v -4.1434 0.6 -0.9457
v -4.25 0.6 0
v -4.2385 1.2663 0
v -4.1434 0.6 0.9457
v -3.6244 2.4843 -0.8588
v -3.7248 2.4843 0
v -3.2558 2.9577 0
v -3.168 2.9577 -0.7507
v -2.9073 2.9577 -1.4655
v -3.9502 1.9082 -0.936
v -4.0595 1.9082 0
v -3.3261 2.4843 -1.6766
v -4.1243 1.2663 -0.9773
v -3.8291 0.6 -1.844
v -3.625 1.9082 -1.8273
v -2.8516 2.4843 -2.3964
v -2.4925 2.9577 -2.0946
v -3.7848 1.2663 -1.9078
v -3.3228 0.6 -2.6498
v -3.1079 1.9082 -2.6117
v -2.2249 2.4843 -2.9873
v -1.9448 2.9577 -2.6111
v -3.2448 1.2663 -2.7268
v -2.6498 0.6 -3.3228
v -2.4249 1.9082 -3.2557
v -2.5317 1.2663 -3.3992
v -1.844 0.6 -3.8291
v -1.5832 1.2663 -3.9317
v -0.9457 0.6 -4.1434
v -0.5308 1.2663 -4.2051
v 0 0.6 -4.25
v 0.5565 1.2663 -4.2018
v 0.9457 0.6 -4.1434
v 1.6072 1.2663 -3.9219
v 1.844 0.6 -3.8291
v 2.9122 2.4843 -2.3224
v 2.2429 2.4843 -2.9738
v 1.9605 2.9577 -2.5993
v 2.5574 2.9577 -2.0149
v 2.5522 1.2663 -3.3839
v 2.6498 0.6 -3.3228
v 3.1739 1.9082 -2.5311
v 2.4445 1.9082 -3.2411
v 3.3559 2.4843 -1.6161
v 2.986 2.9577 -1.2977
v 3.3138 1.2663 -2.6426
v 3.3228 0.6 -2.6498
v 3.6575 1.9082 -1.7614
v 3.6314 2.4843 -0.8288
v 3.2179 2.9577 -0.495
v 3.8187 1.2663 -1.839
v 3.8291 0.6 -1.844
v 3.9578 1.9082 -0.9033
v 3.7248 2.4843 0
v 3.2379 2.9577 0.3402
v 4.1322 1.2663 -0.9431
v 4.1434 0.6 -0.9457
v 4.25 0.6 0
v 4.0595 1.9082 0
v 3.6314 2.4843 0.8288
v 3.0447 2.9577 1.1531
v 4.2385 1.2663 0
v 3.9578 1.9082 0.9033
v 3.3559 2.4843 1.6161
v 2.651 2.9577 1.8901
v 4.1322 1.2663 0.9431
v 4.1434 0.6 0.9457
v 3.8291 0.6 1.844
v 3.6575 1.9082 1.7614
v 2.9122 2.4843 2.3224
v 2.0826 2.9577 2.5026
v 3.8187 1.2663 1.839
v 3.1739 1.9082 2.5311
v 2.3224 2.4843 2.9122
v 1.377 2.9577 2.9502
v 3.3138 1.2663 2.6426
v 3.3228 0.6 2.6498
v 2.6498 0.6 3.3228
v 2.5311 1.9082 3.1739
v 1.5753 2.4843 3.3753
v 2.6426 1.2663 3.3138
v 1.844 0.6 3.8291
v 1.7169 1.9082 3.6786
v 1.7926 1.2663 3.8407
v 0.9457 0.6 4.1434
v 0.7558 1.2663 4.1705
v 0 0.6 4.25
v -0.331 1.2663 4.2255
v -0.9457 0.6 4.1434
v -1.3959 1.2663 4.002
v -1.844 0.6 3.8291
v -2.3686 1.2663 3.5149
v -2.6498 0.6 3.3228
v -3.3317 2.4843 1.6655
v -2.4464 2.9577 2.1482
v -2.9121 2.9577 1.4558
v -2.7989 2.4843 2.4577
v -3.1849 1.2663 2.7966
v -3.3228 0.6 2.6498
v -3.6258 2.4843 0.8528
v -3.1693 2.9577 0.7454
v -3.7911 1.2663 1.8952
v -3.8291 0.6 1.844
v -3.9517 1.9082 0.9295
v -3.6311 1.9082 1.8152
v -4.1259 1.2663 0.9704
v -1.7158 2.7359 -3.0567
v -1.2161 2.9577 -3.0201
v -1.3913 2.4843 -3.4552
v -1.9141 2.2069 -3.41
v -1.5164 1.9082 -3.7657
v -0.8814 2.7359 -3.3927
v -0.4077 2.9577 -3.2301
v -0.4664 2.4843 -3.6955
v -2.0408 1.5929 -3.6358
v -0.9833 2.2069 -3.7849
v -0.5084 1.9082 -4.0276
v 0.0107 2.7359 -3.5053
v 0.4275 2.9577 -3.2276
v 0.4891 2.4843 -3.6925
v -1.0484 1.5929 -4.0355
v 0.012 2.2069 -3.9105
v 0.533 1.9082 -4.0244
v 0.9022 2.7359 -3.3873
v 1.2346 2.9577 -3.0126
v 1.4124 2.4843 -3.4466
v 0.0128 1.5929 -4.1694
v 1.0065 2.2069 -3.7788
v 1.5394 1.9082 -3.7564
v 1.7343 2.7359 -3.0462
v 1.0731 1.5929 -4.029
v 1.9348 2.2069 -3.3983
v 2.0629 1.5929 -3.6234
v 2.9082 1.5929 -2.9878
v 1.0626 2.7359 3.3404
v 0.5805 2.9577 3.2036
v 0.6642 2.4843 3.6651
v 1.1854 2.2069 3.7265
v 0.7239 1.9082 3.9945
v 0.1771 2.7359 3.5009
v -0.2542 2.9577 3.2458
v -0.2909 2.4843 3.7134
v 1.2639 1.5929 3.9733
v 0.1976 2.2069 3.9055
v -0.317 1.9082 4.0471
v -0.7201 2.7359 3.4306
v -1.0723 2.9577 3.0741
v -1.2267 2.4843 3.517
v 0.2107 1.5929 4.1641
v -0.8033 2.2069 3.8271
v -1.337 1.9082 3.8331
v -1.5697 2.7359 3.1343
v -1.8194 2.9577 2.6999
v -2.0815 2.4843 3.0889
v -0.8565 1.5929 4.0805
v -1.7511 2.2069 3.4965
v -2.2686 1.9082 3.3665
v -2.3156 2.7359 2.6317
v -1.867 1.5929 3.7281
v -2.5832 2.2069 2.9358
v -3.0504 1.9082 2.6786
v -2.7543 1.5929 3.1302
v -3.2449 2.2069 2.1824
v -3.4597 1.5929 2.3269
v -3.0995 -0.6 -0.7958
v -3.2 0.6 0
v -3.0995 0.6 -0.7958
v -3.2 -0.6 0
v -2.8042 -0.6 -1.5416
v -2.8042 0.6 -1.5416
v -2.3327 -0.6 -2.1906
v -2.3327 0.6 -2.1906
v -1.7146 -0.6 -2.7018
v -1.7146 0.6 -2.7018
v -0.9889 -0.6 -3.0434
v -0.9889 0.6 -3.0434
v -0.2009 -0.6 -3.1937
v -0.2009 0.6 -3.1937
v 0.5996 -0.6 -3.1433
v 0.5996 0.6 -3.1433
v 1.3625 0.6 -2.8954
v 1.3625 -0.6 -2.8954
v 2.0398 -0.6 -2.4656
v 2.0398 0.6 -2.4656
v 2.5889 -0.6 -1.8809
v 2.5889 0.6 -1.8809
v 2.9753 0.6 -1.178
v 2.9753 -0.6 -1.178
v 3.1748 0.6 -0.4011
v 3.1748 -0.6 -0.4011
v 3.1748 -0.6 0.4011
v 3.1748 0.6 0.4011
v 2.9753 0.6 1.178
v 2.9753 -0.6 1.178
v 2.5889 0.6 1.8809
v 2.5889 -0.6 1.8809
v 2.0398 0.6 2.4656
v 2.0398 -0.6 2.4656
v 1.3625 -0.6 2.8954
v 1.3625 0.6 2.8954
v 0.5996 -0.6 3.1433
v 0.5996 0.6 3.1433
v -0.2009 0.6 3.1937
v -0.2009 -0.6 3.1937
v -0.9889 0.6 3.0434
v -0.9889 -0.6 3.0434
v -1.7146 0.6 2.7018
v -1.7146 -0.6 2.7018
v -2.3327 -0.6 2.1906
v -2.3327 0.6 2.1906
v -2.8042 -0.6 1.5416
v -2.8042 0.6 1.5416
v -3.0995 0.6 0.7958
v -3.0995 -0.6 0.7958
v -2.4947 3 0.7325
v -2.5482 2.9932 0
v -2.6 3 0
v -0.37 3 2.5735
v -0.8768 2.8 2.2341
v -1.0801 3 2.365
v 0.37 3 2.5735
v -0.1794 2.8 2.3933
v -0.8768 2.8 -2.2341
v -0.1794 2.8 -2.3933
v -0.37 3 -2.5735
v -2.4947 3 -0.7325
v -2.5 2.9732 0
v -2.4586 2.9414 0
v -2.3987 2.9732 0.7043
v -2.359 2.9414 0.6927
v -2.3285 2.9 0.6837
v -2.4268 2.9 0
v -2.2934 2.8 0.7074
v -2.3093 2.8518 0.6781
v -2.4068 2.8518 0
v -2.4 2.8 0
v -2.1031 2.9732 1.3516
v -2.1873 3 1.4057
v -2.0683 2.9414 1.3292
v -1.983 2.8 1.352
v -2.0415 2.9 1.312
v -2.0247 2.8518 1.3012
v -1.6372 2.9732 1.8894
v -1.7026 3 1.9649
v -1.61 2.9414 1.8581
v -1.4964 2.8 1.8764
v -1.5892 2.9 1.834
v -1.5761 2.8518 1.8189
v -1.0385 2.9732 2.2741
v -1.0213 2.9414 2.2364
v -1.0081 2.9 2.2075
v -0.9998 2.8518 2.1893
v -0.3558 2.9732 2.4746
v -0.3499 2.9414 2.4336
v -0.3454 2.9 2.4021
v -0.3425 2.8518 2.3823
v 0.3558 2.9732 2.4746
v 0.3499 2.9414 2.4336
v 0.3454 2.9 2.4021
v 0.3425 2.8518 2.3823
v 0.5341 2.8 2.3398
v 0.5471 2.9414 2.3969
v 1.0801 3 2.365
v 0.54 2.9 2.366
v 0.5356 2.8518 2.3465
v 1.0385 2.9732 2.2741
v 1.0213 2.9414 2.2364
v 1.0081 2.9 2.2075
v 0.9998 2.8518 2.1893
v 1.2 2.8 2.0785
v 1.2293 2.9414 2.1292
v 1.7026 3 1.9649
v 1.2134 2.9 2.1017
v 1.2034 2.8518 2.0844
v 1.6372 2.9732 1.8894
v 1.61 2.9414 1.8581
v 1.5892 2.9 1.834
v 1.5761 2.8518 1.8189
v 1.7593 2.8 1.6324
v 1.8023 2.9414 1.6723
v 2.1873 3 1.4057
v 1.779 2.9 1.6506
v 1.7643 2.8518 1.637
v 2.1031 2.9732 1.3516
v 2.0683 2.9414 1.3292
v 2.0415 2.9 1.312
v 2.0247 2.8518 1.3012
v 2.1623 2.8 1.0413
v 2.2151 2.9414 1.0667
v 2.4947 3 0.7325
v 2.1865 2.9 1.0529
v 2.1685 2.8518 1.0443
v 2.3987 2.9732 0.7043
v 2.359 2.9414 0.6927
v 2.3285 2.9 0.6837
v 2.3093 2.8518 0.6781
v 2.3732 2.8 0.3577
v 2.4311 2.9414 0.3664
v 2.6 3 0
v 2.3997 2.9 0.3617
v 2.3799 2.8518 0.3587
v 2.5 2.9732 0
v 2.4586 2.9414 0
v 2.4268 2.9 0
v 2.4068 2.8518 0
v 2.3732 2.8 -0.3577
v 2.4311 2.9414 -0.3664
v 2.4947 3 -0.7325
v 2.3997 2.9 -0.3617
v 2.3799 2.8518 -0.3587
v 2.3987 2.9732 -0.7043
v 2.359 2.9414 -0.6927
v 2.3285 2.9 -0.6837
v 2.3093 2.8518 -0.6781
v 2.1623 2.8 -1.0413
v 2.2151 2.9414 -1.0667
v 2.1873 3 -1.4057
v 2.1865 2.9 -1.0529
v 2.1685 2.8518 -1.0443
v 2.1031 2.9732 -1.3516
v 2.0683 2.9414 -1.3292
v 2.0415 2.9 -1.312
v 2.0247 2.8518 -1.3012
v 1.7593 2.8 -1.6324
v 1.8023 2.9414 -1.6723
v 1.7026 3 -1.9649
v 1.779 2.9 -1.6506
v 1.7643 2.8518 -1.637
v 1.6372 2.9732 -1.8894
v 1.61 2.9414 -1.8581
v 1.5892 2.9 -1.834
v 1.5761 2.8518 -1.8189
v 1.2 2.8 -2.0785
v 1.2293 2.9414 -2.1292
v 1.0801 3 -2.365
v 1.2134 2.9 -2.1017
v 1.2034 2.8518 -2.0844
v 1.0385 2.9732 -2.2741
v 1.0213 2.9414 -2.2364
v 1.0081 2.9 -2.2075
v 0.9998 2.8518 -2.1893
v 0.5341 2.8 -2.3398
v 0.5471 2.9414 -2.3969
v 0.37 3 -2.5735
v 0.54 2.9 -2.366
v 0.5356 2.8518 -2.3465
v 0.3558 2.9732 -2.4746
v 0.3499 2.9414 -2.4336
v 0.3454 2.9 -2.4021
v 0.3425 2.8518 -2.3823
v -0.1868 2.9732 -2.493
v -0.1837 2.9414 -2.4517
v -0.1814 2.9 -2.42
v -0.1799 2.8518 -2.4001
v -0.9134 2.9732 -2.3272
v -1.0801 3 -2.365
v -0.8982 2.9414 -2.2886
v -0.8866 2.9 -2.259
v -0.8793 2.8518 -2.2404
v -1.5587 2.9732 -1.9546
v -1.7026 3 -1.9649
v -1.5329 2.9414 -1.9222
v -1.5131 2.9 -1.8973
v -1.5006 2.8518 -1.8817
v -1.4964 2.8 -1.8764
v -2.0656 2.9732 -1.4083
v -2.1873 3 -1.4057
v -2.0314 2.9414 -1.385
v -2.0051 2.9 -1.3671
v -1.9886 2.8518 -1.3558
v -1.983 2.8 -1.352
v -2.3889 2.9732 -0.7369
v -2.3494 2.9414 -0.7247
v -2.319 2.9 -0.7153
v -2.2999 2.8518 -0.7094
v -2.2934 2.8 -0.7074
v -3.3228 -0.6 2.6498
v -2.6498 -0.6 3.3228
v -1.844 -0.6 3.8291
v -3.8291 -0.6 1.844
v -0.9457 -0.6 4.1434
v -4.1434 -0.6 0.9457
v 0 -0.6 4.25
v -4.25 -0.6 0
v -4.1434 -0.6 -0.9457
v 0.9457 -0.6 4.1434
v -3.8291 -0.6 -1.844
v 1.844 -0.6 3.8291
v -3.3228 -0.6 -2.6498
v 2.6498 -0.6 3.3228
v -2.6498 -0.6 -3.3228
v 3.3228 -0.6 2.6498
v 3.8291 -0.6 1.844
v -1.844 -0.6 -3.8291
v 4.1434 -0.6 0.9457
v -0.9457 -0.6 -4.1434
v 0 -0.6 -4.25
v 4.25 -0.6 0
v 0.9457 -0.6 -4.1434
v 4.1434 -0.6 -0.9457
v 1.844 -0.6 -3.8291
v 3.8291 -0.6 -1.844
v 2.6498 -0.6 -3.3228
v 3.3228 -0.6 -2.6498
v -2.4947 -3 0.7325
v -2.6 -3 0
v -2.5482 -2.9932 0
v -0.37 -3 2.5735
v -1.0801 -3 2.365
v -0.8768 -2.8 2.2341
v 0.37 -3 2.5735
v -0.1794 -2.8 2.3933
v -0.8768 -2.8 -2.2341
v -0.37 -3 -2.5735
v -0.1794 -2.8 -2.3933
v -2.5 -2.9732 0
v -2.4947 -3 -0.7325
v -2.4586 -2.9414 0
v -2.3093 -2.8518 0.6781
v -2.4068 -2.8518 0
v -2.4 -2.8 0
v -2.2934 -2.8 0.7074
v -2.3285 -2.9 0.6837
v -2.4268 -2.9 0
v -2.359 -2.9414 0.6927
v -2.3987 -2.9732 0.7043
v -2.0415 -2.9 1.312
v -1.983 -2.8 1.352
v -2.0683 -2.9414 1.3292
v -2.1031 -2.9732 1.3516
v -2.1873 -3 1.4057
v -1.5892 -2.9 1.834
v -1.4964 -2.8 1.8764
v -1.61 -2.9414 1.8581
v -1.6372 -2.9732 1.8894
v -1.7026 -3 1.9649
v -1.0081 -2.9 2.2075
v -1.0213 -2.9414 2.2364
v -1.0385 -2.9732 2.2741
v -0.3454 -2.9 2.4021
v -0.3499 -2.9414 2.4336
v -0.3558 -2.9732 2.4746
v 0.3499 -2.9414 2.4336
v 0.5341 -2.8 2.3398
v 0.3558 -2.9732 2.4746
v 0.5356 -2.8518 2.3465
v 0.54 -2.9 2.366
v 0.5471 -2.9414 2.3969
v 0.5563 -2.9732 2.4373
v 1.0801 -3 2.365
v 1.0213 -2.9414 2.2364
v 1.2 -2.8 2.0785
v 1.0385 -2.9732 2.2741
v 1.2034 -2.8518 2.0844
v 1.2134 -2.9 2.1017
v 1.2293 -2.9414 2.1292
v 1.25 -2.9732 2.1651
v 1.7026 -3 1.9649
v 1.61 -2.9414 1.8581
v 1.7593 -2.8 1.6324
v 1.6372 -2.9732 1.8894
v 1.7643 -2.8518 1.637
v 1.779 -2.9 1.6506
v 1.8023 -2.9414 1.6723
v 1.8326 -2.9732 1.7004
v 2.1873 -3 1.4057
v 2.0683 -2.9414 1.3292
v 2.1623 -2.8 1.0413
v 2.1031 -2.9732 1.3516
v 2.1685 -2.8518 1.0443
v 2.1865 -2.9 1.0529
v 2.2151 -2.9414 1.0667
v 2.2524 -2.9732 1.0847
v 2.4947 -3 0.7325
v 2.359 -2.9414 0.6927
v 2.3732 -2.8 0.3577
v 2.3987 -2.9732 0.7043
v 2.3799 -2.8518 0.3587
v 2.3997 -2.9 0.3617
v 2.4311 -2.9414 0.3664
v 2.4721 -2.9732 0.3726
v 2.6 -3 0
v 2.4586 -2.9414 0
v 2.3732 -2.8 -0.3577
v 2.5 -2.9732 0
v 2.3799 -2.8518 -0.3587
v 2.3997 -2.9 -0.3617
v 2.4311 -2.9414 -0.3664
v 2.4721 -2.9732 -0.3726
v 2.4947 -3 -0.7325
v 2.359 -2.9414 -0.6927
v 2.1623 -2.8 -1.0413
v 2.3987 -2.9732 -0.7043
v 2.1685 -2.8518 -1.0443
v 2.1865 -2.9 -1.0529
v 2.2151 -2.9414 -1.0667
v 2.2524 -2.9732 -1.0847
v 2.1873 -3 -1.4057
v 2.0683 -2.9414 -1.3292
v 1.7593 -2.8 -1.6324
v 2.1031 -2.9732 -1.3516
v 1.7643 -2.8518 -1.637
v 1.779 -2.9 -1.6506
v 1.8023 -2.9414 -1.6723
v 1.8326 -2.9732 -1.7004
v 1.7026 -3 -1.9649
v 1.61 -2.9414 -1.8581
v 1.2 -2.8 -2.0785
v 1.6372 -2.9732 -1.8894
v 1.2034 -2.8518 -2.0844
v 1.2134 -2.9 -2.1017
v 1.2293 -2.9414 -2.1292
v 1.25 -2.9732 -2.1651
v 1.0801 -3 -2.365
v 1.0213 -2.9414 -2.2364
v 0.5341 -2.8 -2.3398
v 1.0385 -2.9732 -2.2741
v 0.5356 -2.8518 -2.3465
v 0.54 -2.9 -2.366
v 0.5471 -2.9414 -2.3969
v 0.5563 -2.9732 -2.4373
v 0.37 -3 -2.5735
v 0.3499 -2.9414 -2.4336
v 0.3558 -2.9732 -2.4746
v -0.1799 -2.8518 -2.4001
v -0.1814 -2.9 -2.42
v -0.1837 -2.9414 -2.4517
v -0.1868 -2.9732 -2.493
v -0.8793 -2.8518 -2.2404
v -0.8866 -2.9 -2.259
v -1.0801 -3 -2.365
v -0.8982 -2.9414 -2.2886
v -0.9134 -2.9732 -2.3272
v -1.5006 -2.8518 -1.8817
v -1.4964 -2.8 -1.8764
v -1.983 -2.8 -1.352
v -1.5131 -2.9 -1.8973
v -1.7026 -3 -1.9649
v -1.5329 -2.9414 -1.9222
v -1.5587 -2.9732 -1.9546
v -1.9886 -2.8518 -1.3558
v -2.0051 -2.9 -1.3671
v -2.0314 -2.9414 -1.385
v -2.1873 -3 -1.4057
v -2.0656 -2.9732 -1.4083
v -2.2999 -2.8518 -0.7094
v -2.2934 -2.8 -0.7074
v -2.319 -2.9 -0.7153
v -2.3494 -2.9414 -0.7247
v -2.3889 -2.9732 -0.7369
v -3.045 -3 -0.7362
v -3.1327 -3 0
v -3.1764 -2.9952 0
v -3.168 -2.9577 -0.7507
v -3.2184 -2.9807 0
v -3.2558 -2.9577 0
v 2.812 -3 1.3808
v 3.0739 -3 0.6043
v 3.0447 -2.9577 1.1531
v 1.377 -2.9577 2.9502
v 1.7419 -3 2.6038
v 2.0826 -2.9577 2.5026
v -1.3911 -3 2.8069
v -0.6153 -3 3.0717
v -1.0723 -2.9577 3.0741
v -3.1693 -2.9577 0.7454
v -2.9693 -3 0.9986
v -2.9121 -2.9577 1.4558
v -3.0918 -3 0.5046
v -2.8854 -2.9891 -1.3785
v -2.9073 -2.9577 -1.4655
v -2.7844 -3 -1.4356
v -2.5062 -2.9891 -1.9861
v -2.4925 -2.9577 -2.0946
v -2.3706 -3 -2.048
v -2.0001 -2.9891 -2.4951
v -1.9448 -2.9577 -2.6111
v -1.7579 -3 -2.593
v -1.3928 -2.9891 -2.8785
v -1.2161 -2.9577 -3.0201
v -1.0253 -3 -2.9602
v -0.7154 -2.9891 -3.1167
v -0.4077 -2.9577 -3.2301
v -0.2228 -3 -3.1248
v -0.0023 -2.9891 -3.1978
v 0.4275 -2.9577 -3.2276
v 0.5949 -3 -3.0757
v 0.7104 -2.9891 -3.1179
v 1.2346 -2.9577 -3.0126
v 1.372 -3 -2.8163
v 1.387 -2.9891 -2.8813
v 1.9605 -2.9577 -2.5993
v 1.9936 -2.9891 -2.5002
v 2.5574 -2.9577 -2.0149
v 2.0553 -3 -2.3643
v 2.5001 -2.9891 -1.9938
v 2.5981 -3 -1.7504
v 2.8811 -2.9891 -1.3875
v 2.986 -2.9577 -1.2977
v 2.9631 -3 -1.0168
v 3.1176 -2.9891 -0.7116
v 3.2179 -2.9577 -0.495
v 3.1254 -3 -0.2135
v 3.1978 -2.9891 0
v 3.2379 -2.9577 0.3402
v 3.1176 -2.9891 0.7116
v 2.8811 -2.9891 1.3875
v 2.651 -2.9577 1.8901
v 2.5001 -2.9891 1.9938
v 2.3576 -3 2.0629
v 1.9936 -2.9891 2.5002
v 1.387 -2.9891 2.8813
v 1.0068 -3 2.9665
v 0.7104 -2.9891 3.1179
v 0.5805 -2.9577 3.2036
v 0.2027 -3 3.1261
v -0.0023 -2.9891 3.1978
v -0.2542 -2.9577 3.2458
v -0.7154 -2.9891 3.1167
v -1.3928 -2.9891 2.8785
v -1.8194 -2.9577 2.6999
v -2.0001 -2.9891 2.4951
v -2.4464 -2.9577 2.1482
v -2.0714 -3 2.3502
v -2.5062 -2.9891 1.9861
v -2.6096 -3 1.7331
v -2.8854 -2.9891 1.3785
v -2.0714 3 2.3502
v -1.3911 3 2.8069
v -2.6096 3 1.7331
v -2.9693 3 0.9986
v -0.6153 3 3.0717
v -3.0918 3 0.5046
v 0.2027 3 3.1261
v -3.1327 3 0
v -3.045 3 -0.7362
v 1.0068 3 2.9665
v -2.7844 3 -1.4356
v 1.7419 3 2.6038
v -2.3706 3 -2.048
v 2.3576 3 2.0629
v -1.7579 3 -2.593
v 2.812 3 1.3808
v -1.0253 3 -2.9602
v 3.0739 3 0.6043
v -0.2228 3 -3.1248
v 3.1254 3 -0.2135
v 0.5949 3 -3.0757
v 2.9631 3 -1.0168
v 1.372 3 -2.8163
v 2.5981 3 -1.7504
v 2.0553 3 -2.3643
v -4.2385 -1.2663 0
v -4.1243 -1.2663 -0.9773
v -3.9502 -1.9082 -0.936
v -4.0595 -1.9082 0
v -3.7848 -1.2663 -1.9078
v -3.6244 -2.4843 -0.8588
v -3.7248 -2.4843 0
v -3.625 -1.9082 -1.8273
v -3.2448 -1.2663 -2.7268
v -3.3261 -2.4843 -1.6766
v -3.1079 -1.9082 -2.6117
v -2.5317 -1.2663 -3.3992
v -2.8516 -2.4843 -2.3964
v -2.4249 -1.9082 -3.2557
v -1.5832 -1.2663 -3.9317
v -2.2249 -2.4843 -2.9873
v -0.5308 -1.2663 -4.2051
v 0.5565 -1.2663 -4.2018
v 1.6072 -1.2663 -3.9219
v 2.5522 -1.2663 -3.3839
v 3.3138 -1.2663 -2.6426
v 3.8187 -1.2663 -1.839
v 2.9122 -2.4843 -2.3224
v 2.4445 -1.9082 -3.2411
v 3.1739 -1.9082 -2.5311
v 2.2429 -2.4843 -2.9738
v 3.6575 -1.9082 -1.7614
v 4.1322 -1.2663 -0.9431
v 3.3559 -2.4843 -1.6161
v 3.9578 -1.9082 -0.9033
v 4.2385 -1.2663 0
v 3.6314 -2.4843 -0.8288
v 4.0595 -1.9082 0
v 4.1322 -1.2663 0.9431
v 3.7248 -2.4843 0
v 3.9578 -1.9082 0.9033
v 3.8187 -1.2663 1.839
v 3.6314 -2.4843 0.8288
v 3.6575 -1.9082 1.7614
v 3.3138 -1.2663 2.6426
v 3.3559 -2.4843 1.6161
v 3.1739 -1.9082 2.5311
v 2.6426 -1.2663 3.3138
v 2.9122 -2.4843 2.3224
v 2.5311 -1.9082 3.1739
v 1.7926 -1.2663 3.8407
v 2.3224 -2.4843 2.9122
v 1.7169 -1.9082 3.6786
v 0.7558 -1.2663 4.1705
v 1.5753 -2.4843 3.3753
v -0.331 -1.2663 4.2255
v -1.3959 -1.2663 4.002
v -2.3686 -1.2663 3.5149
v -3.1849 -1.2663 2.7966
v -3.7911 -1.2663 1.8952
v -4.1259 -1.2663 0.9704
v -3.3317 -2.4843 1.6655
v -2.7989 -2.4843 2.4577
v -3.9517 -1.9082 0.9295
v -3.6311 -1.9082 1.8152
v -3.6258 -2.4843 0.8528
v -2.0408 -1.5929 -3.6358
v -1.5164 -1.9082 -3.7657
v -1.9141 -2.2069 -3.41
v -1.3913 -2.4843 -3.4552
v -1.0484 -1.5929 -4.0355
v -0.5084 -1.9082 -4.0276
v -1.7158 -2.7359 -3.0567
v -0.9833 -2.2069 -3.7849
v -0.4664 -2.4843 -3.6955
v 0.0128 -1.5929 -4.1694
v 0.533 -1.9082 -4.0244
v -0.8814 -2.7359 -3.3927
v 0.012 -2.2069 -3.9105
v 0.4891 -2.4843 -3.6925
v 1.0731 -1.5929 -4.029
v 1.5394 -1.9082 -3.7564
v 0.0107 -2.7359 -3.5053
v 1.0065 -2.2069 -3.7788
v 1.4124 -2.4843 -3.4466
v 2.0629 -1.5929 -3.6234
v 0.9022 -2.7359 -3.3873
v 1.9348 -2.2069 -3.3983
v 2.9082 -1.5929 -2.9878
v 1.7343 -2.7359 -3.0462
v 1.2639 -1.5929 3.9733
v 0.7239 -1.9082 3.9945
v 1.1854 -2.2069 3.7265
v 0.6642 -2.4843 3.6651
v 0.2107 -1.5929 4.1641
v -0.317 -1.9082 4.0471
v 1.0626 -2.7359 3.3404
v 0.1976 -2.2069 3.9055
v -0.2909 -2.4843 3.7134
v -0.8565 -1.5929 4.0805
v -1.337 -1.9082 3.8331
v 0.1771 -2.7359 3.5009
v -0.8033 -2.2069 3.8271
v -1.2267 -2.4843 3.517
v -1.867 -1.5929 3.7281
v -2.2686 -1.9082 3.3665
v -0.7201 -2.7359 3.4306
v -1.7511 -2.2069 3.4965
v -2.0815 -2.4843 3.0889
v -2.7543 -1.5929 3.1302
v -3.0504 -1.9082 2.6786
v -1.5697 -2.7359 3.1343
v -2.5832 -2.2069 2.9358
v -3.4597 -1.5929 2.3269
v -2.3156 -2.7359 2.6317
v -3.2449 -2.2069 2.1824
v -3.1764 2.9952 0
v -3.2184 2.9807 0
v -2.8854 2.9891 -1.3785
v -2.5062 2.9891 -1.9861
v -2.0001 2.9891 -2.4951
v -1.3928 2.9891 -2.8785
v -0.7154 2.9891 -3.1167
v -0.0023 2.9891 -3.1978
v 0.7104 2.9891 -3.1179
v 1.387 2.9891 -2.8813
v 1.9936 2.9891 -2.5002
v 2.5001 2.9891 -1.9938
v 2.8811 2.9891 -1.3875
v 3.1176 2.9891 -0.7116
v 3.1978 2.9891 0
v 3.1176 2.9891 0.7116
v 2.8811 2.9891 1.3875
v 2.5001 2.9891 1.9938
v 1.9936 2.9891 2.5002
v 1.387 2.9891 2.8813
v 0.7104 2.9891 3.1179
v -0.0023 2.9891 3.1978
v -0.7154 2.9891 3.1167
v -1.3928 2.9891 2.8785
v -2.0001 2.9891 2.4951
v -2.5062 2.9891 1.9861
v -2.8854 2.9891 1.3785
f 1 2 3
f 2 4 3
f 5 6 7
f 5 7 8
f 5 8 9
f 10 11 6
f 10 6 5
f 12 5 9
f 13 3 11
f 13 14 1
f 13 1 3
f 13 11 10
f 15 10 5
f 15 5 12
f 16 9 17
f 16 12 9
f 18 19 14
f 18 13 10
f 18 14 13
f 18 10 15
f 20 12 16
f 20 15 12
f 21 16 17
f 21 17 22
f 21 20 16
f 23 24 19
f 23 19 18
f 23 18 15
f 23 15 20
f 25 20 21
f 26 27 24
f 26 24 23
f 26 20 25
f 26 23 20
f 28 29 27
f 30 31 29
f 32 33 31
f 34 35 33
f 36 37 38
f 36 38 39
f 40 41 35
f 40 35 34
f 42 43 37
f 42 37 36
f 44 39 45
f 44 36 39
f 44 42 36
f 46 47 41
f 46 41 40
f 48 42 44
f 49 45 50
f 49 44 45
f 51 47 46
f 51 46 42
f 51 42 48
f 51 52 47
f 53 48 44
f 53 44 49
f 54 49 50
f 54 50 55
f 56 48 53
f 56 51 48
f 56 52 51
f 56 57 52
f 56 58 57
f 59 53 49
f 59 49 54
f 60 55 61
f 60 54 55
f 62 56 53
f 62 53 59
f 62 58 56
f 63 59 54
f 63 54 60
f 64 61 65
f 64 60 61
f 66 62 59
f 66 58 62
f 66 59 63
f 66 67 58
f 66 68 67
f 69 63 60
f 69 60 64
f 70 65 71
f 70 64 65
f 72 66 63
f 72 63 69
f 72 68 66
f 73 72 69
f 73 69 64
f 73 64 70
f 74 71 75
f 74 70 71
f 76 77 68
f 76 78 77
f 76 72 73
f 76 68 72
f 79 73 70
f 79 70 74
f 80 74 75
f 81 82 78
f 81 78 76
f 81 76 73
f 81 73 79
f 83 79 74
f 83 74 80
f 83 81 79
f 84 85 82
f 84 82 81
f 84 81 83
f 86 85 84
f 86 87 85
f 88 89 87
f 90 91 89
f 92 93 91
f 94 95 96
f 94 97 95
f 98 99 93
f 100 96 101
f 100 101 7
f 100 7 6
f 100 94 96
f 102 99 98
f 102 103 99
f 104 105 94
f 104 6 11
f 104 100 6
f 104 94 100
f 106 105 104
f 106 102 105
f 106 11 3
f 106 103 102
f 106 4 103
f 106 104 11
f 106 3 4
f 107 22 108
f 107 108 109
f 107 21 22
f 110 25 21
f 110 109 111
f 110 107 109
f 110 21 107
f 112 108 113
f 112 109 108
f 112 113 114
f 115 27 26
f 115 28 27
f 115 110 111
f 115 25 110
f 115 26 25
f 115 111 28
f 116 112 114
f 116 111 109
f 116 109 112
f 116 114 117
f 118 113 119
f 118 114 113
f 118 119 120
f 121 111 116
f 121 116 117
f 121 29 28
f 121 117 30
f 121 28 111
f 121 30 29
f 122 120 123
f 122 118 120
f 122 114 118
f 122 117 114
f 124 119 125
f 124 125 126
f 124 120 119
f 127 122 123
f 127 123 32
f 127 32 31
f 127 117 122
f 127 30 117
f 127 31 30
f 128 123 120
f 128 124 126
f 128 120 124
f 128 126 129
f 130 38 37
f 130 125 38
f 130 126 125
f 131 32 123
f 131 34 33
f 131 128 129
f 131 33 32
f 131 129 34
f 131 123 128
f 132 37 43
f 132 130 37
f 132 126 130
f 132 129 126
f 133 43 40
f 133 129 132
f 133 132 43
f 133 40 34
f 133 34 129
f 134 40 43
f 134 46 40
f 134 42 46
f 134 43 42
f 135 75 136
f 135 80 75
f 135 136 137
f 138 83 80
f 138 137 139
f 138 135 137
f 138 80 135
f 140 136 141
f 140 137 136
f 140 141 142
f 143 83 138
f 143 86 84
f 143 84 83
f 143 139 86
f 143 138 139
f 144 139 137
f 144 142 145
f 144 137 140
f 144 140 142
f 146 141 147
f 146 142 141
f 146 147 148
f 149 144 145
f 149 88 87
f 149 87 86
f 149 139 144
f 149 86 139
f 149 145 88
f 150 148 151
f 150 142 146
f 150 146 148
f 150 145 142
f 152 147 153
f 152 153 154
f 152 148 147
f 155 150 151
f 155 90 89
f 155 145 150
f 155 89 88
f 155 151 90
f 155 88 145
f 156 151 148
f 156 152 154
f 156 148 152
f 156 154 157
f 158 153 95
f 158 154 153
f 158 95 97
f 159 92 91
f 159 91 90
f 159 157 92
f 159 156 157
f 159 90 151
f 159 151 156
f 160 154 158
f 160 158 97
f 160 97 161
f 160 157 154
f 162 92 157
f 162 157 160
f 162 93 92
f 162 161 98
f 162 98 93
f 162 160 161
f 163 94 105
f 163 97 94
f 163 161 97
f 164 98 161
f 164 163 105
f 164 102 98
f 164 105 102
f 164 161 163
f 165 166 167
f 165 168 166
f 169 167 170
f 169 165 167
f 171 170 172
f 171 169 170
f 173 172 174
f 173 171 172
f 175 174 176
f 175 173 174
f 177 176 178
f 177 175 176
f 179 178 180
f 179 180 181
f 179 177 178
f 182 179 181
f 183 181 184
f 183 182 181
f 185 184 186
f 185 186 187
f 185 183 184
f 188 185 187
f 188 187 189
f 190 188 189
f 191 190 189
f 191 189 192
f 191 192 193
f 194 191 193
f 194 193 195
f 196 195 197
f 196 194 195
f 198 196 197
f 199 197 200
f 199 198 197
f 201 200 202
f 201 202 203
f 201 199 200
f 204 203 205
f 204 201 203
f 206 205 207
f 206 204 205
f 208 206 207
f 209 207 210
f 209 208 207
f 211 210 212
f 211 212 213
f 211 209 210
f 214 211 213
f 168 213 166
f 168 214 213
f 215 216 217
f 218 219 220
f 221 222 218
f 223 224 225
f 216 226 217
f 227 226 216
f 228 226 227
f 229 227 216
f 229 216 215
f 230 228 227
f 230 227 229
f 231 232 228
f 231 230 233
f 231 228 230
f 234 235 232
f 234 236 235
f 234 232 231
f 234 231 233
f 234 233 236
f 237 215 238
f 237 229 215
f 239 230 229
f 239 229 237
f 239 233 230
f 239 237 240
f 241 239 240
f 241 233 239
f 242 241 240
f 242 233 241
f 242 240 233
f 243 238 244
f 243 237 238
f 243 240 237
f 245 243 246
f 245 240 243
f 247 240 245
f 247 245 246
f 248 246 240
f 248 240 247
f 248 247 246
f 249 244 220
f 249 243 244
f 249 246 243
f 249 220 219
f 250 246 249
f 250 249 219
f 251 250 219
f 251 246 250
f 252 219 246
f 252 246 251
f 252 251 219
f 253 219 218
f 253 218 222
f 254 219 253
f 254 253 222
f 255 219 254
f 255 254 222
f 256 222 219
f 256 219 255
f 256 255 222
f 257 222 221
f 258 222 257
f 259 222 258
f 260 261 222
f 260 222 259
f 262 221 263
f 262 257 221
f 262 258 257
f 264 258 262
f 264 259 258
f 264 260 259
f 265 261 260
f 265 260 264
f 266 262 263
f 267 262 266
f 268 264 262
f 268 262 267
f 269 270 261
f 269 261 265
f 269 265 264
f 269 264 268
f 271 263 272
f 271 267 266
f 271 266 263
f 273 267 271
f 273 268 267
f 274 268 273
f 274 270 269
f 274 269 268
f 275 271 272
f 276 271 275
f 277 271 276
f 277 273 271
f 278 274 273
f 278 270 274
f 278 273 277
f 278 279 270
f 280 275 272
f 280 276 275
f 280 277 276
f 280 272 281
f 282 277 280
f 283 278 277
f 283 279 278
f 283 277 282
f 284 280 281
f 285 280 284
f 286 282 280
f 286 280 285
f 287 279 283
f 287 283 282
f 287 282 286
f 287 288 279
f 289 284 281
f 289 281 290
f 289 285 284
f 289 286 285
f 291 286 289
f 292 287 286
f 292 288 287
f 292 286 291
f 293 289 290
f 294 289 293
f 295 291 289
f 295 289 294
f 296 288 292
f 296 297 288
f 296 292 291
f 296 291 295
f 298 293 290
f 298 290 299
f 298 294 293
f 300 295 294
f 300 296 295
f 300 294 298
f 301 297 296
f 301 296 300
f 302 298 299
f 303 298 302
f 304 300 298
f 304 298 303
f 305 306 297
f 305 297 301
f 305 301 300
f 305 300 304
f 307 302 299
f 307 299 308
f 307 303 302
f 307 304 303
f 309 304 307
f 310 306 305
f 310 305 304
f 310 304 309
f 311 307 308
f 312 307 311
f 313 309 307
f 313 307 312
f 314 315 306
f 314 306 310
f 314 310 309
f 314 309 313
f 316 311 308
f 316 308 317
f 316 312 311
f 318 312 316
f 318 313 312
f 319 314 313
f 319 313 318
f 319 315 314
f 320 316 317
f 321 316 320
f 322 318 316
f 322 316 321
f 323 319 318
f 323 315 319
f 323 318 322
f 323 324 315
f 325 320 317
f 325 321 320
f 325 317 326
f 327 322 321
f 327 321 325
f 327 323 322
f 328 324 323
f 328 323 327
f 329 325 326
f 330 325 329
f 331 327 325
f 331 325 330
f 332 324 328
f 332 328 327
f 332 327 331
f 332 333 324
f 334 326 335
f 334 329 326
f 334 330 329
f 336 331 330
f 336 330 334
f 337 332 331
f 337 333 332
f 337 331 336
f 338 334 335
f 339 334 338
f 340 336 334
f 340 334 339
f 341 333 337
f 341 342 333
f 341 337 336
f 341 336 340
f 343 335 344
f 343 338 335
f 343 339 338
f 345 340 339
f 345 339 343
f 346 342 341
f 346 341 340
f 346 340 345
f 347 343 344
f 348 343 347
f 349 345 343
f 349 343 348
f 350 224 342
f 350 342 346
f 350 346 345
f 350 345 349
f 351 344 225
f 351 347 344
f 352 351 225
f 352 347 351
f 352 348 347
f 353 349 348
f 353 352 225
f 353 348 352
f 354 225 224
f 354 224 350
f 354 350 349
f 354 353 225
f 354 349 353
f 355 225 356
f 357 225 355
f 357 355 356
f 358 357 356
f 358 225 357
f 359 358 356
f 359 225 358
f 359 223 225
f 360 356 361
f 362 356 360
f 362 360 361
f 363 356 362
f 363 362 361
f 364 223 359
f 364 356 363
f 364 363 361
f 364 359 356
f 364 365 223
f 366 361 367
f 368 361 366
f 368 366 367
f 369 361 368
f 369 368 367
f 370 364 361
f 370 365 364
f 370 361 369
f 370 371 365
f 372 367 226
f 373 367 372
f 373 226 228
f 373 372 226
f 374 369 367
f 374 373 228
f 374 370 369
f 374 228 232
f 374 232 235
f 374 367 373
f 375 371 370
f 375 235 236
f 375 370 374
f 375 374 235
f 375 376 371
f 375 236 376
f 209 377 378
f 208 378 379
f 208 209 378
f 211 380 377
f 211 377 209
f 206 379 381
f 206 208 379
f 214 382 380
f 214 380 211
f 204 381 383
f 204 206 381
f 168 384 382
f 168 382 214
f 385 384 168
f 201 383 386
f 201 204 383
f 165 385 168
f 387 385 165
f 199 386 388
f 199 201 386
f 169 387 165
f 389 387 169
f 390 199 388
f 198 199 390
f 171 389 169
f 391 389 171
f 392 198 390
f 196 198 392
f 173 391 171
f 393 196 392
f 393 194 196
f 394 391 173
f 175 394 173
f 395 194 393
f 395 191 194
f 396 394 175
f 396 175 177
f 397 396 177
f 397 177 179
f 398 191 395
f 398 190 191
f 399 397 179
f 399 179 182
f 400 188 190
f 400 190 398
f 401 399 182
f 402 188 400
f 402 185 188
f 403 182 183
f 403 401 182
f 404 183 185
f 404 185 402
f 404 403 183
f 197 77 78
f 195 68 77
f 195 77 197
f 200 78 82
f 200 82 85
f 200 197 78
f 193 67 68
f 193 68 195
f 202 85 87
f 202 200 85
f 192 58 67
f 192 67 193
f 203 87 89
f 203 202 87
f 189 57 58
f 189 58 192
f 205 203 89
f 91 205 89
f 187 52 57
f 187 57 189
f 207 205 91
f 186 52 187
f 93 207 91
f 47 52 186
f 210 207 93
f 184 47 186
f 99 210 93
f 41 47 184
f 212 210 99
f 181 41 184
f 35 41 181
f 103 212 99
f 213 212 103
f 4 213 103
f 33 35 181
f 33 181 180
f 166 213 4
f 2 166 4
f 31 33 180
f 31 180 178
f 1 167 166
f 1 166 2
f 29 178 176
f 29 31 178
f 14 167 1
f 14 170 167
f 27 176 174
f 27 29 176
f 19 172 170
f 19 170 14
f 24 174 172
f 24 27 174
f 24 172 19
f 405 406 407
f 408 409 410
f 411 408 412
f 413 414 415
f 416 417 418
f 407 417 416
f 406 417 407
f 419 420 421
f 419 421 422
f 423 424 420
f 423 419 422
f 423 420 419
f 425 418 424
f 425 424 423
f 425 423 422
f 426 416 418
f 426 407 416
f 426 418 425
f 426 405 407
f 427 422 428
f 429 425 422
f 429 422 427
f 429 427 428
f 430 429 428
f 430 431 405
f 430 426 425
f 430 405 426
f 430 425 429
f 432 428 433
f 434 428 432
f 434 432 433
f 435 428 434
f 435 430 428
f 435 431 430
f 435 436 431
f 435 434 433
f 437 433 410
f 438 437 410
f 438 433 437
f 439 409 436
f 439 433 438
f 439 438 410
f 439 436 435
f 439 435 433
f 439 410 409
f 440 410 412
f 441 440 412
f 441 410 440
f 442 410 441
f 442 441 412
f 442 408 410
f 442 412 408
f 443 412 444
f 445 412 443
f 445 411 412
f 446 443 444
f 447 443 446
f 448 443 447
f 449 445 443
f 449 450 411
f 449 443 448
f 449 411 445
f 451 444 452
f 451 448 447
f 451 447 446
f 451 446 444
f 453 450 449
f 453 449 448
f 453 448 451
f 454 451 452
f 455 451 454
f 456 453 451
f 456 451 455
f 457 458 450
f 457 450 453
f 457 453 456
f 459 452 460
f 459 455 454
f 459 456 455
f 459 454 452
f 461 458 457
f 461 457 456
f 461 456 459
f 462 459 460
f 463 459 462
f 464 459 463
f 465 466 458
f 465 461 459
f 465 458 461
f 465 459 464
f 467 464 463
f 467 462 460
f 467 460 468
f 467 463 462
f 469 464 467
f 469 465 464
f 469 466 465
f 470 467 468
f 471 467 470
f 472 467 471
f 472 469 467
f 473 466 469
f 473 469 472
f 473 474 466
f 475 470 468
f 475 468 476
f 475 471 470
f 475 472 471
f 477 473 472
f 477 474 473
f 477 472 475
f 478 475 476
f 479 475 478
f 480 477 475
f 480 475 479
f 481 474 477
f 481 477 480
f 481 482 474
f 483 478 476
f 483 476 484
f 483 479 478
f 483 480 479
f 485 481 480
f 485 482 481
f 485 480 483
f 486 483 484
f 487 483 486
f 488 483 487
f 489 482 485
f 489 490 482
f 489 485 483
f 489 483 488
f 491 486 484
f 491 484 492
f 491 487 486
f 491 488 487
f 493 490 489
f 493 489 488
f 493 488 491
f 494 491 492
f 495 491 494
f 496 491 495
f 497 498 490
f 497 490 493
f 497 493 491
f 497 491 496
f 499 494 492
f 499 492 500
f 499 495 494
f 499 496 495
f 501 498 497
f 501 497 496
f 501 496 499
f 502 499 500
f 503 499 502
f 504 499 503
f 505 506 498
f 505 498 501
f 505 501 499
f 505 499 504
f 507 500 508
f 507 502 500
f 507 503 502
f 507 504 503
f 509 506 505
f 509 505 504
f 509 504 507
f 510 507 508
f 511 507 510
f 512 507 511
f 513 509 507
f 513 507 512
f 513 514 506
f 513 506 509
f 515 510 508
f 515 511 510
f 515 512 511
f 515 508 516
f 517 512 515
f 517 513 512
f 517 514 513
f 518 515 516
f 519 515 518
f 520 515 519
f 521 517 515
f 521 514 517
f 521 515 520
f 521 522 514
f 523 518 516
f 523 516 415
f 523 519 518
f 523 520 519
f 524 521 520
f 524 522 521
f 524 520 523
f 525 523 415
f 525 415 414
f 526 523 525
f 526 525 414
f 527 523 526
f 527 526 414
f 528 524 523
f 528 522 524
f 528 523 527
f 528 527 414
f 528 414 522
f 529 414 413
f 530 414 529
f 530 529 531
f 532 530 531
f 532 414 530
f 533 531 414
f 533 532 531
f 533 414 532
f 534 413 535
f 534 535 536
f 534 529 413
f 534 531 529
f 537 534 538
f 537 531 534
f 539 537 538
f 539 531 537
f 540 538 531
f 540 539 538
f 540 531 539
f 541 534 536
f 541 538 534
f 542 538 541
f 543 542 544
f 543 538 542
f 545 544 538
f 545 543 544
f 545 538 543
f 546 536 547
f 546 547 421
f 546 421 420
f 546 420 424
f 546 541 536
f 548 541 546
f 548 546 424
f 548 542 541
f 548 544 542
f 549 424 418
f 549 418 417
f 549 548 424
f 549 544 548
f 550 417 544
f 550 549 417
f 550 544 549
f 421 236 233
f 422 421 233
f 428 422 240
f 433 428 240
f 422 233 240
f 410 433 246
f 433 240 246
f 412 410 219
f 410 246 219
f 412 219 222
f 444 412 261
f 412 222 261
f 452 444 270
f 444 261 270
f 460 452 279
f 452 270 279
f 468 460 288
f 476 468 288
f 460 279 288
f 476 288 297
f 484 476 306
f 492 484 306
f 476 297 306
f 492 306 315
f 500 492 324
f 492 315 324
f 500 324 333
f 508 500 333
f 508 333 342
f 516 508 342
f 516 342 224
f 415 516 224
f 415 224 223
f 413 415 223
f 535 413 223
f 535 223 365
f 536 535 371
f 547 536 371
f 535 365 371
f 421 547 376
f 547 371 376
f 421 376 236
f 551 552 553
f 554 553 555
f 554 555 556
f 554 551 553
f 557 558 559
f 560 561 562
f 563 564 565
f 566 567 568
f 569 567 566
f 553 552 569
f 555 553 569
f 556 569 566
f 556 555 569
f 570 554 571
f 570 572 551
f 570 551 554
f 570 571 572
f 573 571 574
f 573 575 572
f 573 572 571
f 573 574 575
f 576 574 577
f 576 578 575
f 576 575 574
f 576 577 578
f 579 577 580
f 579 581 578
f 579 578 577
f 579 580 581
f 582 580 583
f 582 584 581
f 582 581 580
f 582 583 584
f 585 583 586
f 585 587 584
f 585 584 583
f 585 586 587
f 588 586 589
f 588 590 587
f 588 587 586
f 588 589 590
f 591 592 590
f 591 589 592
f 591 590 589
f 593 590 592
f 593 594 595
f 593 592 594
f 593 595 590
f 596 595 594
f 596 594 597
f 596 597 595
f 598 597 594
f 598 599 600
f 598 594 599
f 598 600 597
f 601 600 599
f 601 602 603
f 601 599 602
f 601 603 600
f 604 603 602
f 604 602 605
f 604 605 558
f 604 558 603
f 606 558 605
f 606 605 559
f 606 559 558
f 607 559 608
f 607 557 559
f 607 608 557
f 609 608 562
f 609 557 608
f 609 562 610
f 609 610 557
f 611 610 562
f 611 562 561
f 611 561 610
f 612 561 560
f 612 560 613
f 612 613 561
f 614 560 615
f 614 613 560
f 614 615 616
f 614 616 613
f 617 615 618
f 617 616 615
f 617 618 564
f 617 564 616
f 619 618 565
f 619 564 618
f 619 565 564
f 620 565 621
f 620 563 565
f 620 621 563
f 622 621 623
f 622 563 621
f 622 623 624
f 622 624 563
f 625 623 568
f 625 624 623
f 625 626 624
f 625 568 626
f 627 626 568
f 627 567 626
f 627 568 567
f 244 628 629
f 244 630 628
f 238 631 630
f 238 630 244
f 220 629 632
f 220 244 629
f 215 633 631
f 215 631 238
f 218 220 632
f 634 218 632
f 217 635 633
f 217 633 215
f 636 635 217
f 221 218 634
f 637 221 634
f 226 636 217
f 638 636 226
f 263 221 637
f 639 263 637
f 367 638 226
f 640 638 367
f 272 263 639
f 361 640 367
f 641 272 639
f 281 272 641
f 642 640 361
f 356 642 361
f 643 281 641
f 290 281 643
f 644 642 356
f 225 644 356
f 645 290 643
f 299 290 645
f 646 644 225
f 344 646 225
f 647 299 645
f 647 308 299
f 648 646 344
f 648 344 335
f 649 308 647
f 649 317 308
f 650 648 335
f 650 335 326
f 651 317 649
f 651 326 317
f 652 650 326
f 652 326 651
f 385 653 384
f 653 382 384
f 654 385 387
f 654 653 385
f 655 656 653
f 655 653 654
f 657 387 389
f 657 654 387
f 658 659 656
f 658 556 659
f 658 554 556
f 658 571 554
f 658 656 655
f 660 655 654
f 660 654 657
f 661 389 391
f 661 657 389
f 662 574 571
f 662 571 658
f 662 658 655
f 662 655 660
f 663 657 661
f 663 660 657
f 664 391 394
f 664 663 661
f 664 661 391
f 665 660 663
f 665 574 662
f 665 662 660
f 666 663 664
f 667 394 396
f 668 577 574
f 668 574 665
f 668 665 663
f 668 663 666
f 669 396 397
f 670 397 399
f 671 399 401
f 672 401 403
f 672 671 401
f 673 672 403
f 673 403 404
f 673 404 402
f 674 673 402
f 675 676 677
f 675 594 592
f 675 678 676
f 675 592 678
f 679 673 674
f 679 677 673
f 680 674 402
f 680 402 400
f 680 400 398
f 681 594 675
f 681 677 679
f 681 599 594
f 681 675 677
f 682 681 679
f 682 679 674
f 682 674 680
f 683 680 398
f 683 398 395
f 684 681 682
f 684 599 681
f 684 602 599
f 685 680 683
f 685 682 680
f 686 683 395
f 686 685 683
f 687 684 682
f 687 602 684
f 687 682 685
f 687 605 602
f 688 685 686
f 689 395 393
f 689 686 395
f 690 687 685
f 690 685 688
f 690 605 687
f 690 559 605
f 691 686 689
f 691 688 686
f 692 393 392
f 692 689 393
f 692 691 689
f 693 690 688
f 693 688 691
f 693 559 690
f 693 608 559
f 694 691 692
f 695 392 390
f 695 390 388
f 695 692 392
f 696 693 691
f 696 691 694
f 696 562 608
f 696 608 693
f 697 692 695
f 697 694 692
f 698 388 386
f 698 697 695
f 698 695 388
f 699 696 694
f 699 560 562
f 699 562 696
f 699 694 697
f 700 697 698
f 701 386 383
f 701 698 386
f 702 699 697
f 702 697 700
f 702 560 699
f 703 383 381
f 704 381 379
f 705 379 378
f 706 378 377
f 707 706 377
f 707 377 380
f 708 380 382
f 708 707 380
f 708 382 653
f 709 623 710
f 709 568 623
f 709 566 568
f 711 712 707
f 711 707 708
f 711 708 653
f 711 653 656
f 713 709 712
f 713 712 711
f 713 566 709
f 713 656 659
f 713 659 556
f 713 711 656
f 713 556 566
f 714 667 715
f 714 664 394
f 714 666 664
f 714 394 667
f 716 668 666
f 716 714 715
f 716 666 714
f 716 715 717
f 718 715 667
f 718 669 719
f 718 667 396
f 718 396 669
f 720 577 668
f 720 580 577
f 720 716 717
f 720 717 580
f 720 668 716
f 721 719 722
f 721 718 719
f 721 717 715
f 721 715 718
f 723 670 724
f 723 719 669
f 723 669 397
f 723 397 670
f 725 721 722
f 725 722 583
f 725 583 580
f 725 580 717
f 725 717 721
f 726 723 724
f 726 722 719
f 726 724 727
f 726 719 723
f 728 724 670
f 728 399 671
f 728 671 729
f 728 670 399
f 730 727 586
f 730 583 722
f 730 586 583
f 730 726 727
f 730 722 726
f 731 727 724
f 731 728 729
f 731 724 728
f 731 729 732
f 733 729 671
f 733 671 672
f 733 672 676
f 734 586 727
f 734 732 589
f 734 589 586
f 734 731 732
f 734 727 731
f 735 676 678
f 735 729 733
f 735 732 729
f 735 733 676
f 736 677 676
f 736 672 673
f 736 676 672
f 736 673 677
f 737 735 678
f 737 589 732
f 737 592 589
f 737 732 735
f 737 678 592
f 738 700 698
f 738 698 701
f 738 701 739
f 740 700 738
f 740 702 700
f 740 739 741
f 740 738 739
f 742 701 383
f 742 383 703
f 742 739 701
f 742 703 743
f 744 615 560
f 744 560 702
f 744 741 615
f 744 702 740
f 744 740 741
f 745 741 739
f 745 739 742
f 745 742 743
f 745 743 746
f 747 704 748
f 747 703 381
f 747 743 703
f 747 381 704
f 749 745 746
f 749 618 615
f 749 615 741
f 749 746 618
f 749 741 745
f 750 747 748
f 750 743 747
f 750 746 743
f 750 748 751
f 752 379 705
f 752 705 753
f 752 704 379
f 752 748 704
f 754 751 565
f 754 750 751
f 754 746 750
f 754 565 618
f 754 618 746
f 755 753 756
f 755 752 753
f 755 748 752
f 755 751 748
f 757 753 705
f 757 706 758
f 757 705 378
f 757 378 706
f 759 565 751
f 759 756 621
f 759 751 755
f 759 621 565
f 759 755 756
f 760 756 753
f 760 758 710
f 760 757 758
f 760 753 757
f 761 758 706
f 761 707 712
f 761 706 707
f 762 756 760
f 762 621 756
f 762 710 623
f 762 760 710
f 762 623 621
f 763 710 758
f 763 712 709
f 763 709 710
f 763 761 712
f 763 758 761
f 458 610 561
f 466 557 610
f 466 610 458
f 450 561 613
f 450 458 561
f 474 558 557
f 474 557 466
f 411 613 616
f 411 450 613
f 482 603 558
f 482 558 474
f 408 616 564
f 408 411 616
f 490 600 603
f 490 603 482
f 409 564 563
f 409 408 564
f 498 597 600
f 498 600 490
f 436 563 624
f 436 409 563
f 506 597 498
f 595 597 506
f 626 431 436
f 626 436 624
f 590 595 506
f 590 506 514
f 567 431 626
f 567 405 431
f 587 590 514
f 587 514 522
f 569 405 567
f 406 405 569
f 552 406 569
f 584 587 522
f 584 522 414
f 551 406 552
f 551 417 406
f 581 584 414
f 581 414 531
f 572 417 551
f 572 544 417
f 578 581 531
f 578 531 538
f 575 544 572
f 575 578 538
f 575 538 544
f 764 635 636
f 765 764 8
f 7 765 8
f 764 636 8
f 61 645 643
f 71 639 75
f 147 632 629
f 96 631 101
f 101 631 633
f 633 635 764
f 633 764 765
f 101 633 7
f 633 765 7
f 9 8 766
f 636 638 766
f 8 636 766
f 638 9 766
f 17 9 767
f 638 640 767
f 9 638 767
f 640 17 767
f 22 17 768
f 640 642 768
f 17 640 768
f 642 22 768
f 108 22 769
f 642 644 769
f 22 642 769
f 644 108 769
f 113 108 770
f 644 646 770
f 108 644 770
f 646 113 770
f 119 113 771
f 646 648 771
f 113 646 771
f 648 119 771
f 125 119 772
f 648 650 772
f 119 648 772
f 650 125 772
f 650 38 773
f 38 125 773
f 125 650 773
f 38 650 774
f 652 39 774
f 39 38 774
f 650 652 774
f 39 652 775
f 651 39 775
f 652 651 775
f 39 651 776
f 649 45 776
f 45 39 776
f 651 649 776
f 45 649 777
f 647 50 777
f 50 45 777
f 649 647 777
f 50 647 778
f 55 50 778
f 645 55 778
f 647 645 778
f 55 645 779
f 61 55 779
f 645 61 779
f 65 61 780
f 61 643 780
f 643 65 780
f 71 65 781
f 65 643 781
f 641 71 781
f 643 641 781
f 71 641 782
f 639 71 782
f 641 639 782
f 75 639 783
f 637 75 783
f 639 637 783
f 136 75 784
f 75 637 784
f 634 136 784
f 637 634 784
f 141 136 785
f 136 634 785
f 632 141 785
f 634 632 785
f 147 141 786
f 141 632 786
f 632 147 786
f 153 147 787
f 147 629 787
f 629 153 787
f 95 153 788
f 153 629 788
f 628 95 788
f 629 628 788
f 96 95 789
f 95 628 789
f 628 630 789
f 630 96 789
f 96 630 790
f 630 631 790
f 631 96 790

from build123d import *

# Parameters (mm, degrees)
F2_R     = 2.4
F3_DEPTH = 6
F4_R     = 0.2


with BuildPart() as f1:
    # F0 (on Top) → F1 (revolve)
    with BuildSketch(Plane.XY):
        with BuildLine():
            Line((0, 0), (0, 3))
            Line((0, 3), (-3.2, 3))
            ThreePointArc((-3.2, 3), (-4.0457283791, 1.9403186658), (-4.25, 0.6))
            Line((-4.25, 0.6), (-3.2, 0.6))
            Line((-3.2, 0.6), (-3.2, 0))
            Line((-3.2, 0), (0, 0))
        make_face()
        with BuildLine():
            Line((0, -3), (0, 0))
            Line((0, 0), (-3.2, 0))
            Line((-3.2, 0), (-3.2, -0.6))
            Line((-3.2, -0.6), (-4.25, -0.6))
            ThreePointArc((-4.25, -0.6), (-4.0457283791, -1.9403186658), (-3.2, -3))
            Line((-3.2, -3), (0, -3))
        make_face()
    revolve(axis=Axis((0, 0.3745369613, 0), (0, -1, 0)))

    # F2 (on face) → F3 (cut, through all)
    with BuildSketch(Plane(origin=(0, 3, 0), x_dir=(-1, 0, 0), z_dir=(0, 1, 0))):
        Circle(F2_R)
    extrude(amount=-F3_DEPTH, mode=Mode.SUBTRACT)

    # F4
    f4_edges = [f1.edges().sort_by_distance(p)[0] for p in [
        (2.4, 3, 0),
        (3.2, 3, 0),
        (2.4, -3, 0),
        (3.2, -3, 0),
    ]]
    fillet(f4_edges, radius=F4_R)


solid = f1.part
